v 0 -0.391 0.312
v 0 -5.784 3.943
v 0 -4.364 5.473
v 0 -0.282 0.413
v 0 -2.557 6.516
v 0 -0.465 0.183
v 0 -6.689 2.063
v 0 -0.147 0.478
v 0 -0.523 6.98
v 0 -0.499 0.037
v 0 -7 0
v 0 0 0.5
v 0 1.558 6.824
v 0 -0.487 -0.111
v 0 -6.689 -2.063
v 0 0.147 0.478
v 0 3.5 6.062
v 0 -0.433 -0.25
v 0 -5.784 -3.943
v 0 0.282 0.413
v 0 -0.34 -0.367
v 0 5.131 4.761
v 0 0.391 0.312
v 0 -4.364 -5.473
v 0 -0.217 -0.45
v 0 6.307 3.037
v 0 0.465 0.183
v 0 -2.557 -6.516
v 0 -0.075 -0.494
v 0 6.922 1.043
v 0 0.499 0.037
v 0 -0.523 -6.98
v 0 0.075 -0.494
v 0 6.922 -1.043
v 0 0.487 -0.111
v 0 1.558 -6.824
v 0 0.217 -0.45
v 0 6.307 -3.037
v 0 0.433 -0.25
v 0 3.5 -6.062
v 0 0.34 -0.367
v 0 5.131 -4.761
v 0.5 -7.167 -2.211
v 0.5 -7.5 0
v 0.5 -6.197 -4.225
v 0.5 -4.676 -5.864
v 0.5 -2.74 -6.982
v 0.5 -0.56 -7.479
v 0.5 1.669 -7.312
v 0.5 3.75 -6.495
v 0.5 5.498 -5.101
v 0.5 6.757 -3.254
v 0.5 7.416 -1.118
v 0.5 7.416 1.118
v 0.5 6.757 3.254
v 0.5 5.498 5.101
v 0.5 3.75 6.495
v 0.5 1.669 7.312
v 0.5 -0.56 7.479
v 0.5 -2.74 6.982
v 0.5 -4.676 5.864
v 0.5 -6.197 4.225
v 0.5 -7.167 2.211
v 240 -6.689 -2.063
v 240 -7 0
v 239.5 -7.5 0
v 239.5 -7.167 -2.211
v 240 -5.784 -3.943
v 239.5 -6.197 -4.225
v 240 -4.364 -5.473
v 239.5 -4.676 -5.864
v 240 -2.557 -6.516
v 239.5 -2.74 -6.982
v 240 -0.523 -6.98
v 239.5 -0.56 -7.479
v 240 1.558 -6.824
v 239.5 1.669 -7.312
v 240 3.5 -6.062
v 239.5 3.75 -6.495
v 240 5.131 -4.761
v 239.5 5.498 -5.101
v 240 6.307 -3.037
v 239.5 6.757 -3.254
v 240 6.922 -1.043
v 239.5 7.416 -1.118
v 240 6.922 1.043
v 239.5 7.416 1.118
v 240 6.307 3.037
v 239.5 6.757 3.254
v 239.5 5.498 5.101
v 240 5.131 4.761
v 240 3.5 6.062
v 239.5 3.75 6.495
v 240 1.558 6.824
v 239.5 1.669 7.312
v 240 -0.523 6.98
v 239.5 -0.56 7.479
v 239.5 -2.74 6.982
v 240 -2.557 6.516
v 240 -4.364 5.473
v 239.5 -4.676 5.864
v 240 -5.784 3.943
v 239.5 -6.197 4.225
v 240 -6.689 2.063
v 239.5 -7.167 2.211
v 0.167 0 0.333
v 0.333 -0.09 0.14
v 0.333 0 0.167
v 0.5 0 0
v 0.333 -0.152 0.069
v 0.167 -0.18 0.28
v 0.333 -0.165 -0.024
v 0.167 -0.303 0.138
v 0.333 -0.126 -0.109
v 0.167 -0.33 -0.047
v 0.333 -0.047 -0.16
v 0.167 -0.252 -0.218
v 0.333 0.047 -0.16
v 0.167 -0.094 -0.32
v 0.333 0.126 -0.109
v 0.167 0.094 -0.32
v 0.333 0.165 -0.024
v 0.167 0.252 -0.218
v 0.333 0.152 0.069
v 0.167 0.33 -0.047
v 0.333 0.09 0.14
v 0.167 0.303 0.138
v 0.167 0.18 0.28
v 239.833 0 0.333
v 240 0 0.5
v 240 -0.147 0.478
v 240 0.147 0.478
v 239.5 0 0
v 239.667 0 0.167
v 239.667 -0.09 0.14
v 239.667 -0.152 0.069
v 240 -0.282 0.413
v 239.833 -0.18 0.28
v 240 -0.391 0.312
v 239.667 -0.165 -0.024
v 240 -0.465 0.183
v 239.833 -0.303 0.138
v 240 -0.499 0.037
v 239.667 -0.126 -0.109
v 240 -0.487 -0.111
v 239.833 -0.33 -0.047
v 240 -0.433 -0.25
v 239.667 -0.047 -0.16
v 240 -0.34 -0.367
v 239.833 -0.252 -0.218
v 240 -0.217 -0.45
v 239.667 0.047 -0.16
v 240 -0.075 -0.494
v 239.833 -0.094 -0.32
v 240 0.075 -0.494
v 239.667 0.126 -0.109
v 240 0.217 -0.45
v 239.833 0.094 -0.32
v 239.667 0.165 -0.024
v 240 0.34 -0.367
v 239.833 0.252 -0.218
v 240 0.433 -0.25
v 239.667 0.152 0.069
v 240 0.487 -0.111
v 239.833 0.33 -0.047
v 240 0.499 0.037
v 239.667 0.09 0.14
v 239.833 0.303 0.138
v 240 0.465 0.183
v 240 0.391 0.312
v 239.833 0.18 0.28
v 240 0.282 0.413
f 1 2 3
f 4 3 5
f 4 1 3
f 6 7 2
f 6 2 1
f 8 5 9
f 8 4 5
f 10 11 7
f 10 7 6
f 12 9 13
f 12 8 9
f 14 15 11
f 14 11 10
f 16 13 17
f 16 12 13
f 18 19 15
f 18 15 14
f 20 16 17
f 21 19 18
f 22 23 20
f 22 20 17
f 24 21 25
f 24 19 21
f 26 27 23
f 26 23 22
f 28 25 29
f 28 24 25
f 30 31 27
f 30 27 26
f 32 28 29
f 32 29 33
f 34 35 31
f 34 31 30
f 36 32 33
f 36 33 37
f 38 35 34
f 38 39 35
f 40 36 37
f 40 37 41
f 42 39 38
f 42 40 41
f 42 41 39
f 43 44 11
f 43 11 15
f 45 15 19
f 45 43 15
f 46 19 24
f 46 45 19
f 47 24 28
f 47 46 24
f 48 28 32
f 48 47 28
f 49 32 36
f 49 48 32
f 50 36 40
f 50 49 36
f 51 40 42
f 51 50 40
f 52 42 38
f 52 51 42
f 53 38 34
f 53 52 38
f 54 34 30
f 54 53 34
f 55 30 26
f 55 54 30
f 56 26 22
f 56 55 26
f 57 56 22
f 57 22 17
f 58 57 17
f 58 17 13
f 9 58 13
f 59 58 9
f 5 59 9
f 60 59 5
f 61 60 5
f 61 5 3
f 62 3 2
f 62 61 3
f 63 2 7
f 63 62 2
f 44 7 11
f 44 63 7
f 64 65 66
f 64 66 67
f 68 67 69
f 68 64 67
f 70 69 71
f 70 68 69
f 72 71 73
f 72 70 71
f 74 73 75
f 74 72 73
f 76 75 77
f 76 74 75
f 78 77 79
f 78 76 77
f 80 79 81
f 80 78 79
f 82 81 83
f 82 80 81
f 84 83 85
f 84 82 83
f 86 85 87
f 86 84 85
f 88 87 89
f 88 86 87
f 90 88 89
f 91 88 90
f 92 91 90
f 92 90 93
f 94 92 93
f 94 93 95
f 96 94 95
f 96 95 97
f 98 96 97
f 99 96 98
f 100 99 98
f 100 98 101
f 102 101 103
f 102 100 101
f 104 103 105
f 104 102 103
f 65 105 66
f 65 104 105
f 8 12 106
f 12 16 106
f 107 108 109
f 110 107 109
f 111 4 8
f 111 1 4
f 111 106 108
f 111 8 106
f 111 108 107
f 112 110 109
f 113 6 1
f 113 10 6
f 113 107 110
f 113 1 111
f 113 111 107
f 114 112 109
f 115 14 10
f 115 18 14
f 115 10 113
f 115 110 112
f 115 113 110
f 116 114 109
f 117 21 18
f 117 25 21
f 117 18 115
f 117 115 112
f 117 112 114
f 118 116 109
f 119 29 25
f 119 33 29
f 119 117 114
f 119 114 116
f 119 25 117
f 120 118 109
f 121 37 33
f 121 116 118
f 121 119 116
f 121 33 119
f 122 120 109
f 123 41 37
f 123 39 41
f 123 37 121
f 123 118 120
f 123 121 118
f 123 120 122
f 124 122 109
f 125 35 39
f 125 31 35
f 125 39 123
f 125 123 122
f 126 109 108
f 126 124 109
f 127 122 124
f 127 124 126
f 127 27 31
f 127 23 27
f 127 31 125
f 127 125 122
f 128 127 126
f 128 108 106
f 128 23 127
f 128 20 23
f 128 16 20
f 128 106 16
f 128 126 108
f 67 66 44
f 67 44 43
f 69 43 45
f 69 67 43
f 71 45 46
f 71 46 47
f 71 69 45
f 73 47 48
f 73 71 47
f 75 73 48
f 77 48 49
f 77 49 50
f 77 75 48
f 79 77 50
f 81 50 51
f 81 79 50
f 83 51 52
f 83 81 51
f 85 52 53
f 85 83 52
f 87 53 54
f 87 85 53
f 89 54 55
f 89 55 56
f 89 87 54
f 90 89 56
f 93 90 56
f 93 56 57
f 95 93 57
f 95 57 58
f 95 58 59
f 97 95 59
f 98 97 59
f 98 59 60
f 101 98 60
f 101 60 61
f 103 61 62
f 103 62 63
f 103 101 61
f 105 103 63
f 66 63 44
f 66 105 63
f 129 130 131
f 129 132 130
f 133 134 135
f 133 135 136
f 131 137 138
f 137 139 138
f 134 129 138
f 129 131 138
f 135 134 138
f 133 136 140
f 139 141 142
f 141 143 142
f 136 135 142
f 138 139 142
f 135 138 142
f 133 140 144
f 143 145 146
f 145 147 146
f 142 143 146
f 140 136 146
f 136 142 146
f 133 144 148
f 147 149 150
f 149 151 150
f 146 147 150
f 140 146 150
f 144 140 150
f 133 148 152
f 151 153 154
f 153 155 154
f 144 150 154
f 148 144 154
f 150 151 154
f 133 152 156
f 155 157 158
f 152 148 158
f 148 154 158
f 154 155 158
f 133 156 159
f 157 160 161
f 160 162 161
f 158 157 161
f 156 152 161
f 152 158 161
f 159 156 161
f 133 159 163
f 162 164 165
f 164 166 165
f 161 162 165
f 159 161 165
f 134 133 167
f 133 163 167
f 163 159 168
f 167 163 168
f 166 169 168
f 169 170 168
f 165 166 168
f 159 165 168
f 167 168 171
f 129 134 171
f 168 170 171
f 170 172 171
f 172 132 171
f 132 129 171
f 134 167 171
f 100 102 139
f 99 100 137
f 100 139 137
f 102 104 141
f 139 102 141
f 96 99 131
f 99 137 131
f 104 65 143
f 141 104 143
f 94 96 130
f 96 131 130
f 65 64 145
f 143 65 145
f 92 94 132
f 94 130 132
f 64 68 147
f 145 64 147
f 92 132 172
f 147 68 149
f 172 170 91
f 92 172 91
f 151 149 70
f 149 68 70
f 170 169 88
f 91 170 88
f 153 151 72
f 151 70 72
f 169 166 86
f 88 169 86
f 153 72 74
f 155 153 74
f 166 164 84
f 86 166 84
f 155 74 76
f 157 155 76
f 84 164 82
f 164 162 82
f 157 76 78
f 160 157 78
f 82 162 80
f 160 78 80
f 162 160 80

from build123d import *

# Parameters (mm, degrees)
SKETCH1_W     = 240
SKETCH1_H     = 7.5
CHAMFER1_SIZE = 0.5


with BuildPart() as part:
    # Sketch1 → Revolve1 (revolve)
    with BuildSketch(Plane.XY, mode=Mode.PRIVATE) as revolve1_sk:
        with Locations((120, 3.75)):
            Rectangle(SKETCH1_W, SKETCH1_H)
    revolve(revolve1_sk.sketch.rotate(Axis((0, 0, 0), (1, 0, 0)), 180), axis=Axis((0, 0, 0), (1, 0, 0)))

    # Sketch2 → Cut-Revolve1 (revolve, cut)
    with BuildSketch(Plane.XY, mode=Mode.PRIVATE) as cut_revolve1_sk:
        Polygon((0, 0.5), (0, 0), (0.5, 0), align=None)
        Polygon((239.5, 0), (240, 0.5), (240, 0), align=None)
    revolve(cut_revolve1_sk.sketch.rotate(Axis((0, 0, 0), (1, 0, 0)), 90), axis=Axis((0, 0, 0), (1, 0, 0)), mode=Mode.SUBTRACT)

    # Chamfer1
    chamfer1_edges = [part.edges().sort_by_distance(p)[0] for p in [
        (0, 7.5, 0),
        (240, 7.5, 0),
    ]]
    chamfer(chamfer1_edges, length=CHAMFER1_SIZE)


solid = part.part
